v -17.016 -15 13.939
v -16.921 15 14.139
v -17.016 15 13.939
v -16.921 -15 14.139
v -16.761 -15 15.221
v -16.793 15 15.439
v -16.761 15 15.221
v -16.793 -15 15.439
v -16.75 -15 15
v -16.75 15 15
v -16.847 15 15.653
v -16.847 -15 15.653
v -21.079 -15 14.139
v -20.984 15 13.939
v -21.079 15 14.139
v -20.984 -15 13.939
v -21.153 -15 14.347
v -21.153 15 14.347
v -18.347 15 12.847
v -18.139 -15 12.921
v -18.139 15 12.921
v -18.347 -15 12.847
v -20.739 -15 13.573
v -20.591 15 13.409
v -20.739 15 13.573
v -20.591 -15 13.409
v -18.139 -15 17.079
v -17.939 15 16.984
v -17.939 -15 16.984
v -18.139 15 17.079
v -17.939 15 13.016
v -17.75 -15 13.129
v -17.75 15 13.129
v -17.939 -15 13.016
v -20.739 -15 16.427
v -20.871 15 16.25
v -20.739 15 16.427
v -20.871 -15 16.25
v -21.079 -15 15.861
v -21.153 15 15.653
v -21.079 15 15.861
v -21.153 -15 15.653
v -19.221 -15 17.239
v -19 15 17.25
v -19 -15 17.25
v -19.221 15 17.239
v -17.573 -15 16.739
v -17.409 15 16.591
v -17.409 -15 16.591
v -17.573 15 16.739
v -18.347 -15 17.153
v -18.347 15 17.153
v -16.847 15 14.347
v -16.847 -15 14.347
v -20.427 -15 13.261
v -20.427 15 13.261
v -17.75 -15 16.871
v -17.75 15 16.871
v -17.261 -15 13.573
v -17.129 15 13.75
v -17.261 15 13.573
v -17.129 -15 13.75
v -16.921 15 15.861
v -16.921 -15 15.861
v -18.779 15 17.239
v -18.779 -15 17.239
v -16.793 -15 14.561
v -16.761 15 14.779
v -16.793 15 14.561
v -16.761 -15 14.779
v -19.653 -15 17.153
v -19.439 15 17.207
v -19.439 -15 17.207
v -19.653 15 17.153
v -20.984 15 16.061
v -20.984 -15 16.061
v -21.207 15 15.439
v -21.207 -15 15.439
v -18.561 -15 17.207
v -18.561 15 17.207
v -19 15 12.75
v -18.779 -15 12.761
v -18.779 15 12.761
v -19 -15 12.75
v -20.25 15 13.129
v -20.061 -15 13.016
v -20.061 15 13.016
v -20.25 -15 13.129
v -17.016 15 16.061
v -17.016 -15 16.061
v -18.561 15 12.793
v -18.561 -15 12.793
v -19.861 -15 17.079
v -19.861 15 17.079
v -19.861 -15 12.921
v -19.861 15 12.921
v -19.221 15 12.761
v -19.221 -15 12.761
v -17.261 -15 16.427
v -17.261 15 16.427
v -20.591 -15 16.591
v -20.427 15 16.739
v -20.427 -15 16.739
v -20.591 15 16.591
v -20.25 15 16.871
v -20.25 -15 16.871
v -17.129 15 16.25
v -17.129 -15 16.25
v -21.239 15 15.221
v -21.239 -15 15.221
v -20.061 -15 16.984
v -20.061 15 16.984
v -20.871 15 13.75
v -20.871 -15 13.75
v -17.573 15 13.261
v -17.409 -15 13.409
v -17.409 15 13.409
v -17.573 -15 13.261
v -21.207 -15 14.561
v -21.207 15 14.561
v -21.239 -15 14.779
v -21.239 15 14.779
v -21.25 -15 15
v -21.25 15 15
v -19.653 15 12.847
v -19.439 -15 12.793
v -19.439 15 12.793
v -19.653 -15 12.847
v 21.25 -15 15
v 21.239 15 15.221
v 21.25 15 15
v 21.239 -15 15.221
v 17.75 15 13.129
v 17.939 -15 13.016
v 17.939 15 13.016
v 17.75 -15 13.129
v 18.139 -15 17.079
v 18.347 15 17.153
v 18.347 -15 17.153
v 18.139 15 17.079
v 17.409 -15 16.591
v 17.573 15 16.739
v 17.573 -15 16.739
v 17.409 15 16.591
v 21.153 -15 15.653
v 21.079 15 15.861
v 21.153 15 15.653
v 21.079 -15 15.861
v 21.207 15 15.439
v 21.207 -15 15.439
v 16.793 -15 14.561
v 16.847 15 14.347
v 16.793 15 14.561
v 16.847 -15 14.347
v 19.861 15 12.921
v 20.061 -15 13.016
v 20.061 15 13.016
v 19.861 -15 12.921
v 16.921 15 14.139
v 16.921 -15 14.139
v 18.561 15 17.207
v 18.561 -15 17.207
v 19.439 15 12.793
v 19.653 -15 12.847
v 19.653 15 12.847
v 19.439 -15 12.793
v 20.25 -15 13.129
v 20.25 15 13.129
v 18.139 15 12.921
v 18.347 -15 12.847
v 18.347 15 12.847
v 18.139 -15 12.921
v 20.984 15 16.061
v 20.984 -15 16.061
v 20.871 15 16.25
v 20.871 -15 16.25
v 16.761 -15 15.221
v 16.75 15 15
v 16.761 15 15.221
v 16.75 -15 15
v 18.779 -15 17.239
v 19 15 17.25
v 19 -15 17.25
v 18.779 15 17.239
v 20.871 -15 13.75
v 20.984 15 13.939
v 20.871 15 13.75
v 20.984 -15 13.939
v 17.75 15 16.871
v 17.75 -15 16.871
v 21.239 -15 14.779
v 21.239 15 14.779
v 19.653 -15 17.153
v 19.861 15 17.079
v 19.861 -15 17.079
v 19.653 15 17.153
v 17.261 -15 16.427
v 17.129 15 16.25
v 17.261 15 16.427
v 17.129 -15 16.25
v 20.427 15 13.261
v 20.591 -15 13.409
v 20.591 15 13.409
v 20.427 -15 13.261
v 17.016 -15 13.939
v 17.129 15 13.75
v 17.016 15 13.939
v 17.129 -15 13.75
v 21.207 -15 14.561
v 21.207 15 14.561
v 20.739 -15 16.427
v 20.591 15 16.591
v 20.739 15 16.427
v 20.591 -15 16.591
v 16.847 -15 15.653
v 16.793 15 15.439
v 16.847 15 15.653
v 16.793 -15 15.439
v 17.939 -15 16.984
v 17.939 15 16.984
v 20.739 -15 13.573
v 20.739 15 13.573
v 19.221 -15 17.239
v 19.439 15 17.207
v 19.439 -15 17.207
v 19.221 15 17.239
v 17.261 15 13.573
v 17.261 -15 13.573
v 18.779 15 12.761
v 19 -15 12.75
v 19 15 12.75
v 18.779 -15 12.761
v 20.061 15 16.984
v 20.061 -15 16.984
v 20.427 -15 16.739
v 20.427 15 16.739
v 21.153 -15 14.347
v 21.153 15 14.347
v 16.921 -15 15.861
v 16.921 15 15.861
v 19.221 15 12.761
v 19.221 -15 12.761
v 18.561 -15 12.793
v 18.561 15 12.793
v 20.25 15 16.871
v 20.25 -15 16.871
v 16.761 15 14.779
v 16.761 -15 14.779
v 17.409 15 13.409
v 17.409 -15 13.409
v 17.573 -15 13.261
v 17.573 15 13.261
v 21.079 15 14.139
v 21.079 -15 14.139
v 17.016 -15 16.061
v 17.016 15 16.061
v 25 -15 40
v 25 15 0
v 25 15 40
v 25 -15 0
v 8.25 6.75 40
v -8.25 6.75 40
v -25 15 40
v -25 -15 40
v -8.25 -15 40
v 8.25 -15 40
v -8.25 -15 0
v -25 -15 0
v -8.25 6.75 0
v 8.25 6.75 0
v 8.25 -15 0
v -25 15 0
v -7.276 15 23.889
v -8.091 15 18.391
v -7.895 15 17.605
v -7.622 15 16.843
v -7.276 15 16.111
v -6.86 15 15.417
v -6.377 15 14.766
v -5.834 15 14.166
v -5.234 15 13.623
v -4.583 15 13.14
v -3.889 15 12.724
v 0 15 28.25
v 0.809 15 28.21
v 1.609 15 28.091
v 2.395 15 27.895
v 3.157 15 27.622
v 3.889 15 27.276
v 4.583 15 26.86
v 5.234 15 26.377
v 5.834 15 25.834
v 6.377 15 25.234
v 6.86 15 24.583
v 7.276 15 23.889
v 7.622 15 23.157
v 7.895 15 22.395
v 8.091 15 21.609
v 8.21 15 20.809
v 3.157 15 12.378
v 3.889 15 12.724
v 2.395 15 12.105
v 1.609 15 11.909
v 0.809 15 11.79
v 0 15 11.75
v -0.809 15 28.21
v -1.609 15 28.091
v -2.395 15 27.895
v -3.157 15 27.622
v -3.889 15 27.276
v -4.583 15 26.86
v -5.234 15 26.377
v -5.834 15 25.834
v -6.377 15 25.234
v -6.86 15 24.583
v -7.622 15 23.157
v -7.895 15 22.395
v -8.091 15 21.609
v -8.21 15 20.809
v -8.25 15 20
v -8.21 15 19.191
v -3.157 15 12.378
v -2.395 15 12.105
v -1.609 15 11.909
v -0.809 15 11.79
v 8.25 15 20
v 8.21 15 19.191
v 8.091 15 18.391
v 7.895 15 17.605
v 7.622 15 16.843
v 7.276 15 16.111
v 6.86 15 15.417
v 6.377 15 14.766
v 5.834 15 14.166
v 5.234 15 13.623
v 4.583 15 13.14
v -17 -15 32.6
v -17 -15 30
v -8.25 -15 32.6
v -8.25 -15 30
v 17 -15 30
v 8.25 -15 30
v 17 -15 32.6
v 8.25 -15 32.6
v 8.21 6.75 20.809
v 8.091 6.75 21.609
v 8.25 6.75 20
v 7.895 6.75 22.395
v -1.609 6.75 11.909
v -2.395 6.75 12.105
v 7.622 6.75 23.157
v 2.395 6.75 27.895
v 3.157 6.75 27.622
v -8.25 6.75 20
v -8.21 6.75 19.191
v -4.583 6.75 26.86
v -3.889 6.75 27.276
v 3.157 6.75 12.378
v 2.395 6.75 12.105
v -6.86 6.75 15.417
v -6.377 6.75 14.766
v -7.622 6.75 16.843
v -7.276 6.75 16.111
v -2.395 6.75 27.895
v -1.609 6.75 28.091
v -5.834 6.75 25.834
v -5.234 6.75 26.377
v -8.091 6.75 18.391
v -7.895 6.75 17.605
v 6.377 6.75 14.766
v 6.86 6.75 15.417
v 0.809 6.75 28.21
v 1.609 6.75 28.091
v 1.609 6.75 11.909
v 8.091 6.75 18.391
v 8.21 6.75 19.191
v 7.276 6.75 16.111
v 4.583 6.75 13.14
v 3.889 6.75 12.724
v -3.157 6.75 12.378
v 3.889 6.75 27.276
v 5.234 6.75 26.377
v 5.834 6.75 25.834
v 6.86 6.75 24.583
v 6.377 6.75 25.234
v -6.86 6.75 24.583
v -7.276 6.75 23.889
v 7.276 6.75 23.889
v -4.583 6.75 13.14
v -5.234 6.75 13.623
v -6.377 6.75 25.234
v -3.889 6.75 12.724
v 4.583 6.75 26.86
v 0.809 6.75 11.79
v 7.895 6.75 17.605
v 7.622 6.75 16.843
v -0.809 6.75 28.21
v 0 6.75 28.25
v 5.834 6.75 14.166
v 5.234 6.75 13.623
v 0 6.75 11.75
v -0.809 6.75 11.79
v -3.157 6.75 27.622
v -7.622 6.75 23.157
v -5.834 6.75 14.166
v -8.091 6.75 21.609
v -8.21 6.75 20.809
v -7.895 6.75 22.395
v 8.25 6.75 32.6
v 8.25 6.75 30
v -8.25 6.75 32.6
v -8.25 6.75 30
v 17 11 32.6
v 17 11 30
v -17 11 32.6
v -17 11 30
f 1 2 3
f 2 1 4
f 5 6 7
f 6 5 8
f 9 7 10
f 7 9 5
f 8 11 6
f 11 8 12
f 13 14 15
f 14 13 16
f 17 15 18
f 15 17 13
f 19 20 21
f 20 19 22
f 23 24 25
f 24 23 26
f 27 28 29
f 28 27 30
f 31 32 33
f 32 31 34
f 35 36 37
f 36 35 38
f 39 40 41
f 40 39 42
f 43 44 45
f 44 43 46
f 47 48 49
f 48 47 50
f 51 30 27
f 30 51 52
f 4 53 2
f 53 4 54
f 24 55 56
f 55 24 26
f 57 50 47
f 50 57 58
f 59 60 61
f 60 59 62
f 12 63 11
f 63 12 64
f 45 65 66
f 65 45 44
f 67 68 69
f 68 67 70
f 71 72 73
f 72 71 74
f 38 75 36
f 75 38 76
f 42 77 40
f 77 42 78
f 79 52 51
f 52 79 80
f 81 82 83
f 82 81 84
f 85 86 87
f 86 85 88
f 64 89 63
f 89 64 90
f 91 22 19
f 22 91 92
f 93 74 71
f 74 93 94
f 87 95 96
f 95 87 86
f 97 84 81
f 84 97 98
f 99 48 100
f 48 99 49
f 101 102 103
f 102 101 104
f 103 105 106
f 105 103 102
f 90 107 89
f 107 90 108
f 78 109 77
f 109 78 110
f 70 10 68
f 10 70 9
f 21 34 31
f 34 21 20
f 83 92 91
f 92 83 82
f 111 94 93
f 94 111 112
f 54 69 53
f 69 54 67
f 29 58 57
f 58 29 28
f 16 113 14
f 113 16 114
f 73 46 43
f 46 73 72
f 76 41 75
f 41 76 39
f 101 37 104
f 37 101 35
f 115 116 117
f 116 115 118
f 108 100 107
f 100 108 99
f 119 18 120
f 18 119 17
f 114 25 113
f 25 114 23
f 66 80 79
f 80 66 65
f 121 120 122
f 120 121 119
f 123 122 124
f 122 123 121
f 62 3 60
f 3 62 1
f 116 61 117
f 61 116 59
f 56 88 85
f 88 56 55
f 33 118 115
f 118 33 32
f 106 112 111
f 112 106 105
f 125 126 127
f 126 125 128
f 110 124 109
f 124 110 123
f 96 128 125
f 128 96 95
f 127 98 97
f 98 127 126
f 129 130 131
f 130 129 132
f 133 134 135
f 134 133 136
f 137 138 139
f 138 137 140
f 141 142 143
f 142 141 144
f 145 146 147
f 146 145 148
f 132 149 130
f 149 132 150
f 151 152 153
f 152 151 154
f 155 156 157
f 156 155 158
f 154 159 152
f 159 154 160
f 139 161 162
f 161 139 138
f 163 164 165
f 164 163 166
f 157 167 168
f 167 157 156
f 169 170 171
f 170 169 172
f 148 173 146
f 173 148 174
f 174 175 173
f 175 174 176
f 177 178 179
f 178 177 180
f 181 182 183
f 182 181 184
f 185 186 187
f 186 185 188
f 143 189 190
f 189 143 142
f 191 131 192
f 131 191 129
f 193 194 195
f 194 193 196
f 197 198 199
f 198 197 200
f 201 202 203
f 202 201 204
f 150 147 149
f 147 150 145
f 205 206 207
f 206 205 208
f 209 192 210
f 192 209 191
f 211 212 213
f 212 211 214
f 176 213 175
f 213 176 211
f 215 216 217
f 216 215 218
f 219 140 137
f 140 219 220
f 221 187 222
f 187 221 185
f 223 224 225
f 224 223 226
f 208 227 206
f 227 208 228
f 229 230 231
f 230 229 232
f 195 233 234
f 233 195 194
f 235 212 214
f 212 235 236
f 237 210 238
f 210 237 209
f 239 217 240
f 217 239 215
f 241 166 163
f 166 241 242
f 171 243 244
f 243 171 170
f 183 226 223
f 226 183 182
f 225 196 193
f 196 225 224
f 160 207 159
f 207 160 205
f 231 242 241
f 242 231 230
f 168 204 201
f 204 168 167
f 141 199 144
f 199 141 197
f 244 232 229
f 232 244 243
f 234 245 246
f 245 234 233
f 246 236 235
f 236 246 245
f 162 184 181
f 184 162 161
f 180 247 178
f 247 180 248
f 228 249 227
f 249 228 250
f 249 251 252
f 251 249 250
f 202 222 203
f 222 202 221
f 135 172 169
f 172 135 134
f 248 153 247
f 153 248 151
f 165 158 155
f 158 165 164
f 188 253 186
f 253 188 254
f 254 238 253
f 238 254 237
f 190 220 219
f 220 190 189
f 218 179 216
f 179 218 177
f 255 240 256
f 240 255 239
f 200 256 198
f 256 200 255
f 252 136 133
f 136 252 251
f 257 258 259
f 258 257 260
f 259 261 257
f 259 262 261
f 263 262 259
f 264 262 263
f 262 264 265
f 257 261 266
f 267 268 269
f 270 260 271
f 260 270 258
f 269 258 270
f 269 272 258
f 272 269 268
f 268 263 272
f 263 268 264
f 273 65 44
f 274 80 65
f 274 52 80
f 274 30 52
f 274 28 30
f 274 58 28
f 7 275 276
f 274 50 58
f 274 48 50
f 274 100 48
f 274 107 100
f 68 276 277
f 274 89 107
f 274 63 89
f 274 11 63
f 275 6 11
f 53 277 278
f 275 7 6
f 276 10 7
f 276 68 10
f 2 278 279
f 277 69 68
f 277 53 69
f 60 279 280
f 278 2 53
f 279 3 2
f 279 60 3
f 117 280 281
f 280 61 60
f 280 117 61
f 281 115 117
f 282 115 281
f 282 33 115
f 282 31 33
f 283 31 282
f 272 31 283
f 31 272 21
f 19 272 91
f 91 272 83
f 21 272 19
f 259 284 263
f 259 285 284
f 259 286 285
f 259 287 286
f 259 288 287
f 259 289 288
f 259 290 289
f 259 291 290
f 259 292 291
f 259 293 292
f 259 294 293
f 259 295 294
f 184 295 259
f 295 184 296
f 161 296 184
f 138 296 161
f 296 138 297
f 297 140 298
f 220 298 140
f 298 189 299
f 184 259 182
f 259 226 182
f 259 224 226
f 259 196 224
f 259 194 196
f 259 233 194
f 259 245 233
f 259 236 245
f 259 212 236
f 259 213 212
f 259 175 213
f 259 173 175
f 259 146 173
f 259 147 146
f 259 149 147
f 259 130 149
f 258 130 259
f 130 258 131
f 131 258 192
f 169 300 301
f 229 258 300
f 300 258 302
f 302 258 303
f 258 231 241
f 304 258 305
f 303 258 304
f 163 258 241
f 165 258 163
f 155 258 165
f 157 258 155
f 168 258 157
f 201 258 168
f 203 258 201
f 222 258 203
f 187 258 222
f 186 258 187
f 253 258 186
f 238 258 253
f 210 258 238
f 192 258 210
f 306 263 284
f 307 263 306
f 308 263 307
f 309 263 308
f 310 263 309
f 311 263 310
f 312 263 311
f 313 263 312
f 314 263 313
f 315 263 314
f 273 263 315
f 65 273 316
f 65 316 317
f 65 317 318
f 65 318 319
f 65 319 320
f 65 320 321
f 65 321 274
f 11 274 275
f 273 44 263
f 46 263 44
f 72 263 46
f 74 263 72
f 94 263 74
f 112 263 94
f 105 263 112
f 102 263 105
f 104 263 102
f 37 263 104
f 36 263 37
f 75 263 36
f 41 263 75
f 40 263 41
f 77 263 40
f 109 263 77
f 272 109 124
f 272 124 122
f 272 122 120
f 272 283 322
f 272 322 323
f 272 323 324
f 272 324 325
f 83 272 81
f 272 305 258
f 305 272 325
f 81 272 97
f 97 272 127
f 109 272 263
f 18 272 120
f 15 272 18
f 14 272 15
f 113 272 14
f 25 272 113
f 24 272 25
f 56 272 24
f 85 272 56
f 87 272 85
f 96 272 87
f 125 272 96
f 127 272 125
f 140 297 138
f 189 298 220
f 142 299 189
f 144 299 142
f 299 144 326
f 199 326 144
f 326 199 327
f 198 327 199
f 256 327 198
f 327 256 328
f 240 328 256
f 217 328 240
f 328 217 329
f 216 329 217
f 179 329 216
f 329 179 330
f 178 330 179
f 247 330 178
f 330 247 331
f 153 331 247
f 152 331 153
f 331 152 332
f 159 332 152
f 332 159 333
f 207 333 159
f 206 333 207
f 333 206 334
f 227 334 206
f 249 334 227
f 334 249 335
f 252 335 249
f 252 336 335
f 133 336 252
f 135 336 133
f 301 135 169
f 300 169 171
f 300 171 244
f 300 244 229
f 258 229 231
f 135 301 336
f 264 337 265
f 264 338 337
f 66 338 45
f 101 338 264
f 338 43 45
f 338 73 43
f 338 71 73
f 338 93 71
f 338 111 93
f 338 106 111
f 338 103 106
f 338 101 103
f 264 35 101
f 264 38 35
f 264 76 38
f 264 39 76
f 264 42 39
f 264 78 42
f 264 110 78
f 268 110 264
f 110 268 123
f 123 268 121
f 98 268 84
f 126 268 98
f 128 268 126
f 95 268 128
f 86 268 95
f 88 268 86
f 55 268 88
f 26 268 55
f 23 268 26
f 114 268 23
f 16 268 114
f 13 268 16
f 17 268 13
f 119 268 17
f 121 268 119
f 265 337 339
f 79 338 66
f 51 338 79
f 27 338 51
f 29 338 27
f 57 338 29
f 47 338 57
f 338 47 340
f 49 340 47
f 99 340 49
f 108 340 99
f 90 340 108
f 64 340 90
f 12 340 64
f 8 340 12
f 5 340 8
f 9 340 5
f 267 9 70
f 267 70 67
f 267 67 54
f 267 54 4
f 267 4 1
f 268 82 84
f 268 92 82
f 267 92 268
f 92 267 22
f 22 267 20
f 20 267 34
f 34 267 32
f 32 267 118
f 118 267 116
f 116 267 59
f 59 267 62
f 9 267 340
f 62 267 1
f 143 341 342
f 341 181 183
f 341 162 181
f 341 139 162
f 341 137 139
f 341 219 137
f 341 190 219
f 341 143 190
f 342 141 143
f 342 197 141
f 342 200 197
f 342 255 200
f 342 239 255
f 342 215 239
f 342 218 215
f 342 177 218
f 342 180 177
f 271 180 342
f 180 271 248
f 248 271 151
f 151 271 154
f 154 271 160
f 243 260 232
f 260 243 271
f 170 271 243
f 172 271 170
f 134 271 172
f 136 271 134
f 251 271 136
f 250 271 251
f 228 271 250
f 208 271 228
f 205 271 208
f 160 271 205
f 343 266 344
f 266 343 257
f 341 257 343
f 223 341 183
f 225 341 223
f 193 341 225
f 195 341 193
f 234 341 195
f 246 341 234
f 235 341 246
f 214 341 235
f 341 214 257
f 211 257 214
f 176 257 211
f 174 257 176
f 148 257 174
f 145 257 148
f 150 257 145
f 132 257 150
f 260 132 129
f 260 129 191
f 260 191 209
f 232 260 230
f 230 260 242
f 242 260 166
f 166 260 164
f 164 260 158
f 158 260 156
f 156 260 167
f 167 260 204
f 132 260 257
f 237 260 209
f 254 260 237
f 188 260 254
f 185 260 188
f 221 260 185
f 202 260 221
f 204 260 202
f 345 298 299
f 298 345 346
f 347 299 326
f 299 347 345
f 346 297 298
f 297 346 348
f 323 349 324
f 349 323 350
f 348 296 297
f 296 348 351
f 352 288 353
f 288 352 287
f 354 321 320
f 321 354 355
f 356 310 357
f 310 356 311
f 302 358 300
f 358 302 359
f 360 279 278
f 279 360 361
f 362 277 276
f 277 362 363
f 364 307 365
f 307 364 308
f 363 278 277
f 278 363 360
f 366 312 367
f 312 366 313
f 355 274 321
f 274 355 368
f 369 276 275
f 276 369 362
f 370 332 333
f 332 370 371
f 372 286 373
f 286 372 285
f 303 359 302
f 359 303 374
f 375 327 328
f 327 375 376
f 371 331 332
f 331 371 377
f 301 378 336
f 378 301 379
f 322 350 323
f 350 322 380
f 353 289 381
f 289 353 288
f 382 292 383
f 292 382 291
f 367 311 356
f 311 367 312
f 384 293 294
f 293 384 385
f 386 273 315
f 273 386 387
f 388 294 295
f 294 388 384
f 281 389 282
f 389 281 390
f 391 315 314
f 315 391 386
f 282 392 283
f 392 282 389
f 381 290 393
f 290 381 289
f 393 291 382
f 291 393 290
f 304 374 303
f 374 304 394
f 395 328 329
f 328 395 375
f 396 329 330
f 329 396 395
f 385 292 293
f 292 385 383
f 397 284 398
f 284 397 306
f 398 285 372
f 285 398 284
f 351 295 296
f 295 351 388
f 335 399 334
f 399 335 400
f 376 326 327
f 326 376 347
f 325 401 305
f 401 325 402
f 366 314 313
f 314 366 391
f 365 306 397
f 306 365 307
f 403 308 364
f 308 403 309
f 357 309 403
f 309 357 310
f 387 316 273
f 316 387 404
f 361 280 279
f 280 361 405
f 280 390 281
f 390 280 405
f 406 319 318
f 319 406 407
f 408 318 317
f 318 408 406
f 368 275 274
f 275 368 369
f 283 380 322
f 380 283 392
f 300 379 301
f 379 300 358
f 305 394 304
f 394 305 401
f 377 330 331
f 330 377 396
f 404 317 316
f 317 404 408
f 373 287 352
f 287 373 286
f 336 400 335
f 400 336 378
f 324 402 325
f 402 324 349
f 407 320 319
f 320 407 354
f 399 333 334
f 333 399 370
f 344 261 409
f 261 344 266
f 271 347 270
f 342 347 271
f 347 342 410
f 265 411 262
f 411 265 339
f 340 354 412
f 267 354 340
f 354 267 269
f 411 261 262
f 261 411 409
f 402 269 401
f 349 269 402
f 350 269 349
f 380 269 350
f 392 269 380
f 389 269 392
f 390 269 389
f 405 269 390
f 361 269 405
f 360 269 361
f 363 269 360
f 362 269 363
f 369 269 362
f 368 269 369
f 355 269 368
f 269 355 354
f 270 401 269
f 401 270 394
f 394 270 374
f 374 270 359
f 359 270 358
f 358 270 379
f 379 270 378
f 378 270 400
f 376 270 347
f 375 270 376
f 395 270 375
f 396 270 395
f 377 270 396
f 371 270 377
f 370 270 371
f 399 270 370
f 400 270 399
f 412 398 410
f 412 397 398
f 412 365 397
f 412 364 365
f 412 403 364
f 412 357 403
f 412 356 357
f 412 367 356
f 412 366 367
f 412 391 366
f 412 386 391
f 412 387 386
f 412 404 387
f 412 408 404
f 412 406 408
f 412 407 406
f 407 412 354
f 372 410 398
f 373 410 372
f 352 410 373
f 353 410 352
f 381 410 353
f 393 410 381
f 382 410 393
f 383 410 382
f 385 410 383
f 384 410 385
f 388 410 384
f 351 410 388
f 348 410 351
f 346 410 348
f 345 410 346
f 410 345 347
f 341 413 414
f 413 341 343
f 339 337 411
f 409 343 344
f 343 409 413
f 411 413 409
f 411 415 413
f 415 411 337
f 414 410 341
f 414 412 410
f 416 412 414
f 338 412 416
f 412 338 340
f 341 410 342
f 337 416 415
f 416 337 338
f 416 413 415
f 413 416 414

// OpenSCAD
// Wall-mounted 10 mL Syringe Holder
// Dimensions measured with calipers

// Block dimensions
block_w = 50;  // Width (X)
block_d = 30;  // Depth (Y)
block_h = 40;  // Height (Z)

// Barrel channel
barrel_dia = 16;       // Syringe barrel diameter
channel_w = 16.5;      // Channel width (clearance)
channel_r = channel_w / 2;  // Radius of back half-circle

// Flange slot
flange_w = 34;         // Slot width (X)
flange_h = 2.6;        // Slot height (Z)
flange_z_start = 30;   // Bottom of slot
flange_y_end = 11;     // Depth from front (y = -15 to y = 11)

// Wall screw holes
screw_dia = 4.5;       // Hole diameter for M4 screws
screw_x = 19;          // X position of holes (±)
screw_z = 15;          // Z position of holes

// Print quality
$fn = 64;

// Main block, centred on origin in X and Y, resting on z=0
// X: -25 to 25, Y: -15 to 15, Z: 0 to 40
difference() {
    // Solid block
    translate([-block_w/2, -block_d/2, 0])
        cube([block_w, block_d, block_h]);

    // Barrel channel: half-circle at back (y=15) extending to front (y=-15)
    // The half-circle is centred at x=0, y=15 (back face)
    // We model the channel as a union of a half-cylinder at the back and a rectangular prism
    
    // Half-cylinder at the back (cutting into the block from y=15 inward)
    // Orient cylinder along Y axis, centred at (0, 15, block_h/2)
    translate([0, 15, block_h/2])
        rotate([90, 0, 0])  // Orient cylinder along Y
        cylinder(r=channel_r, h=block_h, center=true);
    
    // Rectangular part of the channel (straight sides)
    // From y = 15 - channel_r = 6.75 to y = -15
    // Depth = 6.75 - (-15) = 21.75
    // Centre Y = (6.75 + (-15)) / 2 = -4.125
    translate([0, -4.125, block_h/2])
        cube([channel_w, 21.75, block_h], center=true);

    // Flange slot
    // 34 mm wide (X, centred), 2.6 mm tall (z=30 to 32.6), cut from front (y=-15) back to y=11
    // Depth of cut: from y=-15 to y=11, so length = 26 mm
    // Centre Y = (-15 + 11) / 2 = -2
    // Centre Z = 30 + 2.6/2 = 31.3
    translate([0, -2, 31.3])
        cube([flange_w, 26, flange_h], center=true);

    // Wall screw holes (through Y, from front to back)
    // Two holes at x = -19 and 19, z = 15
    for (sx = [-screw_x, screw_x]) {
        translate([sx, 0, screw_z])
            rotate([90, 0, 0])  // Orient along Y
            cylinder(r=screw_dia/2, h=block_d + 2, center=true);  // +2 for overcut
    }
}
